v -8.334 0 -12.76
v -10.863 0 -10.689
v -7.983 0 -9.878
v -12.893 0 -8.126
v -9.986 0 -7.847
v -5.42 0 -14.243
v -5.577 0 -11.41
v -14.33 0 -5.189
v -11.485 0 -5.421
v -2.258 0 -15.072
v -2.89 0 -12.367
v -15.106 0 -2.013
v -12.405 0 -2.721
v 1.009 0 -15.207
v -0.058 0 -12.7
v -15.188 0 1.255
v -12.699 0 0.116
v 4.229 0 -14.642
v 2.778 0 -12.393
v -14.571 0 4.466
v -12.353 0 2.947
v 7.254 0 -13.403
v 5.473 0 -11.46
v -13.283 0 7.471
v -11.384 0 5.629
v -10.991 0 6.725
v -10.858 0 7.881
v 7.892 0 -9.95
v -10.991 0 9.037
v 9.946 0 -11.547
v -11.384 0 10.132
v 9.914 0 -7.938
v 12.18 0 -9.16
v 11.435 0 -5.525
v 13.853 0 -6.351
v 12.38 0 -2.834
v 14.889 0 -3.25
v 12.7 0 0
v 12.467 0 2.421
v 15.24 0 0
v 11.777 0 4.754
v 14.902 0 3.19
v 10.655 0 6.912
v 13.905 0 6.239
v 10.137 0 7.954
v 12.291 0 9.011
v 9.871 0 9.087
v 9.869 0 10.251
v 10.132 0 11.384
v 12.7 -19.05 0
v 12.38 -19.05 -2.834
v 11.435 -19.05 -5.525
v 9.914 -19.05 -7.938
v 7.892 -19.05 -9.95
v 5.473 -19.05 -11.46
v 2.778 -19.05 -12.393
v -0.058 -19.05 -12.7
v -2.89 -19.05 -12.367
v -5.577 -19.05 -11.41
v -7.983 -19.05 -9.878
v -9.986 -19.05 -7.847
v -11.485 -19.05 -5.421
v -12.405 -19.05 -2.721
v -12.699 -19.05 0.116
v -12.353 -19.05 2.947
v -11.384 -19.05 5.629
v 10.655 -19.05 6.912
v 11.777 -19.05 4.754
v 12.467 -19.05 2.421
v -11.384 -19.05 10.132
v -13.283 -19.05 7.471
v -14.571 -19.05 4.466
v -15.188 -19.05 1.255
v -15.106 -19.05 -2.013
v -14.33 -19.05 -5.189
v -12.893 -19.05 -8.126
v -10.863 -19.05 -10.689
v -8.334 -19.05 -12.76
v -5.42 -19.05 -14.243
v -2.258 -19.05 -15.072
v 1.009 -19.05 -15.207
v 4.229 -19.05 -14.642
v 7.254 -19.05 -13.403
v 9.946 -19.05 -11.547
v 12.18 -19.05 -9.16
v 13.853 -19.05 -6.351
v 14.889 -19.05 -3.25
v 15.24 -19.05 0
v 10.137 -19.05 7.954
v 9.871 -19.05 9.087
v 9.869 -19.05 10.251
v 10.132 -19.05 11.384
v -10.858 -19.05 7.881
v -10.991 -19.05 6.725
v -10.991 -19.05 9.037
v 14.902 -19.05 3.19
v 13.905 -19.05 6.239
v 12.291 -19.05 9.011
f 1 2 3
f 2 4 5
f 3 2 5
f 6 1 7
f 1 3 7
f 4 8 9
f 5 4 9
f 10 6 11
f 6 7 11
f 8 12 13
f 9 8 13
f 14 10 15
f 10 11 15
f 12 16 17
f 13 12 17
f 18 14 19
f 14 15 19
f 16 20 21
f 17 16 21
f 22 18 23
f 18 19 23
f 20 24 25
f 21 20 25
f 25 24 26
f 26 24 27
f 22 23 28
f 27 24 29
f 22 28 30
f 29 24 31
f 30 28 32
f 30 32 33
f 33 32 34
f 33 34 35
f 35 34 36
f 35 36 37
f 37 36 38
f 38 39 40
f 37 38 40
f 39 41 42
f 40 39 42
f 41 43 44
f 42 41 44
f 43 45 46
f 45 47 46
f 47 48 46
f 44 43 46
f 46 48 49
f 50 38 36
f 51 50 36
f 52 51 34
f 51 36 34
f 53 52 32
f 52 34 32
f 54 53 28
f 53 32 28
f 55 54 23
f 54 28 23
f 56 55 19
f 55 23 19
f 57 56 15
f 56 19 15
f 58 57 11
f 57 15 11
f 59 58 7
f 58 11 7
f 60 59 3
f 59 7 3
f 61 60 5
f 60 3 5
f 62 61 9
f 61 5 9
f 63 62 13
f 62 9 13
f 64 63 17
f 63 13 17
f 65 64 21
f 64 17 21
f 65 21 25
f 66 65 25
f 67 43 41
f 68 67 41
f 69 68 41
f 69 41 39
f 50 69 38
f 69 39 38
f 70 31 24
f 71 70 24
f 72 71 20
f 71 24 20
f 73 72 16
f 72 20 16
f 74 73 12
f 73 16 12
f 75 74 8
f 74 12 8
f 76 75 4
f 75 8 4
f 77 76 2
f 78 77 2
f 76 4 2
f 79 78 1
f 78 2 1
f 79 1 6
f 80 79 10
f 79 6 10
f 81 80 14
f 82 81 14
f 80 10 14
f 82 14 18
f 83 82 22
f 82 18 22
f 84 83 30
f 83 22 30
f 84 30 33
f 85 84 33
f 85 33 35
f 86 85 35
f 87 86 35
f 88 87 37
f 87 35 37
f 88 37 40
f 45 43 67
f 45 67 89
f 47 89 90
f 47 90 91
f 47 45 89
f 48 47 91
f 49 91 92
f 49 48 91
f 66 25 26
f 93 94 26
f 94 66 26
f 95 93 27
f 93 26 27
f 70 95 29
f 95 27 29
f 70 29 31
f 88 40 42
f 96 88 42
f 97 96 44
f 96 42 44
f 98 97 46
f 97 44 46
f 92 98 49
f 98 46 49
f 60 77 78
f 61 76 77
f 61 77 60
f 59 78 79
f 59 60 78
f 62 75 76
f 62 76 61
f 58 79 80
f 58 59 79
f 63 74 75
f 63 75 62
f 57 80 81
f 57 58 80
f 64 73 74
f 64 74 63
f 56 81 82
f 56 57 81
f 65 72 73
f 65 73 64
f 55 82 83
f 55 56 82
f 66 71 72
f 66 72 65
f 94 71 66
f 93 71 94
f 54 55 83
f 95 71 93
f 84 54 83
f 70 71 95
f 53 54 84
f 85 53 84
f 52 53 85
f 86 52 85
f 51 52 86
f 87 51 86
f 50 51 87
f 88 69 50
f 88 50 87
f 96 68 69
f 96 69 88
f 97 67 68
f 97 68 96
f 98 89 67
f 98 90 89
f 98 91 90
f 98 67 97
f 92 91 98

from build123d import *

# Parameters (mm, degrees)
F1_DEPTH    = 19.05
F2_T1_DEPTH = 36.0210888614


# Not quite as in the source:
# - a fillet or chamfer that OpenCascade refuses, or shapes differently, is made with other operations: its cross-section is extruded or revolved along the edge and cut away or added


with BuildPart() as f1:
    # F0 (on Front) → F1 (new body)
    with BuildSketch(Plane.XZ):
        with BuildLine():
            ThreePointArc((8.4433957221, 9.4867838955), (11.5870860373, 5.1989842435), (12.7, 0))
            ThreePointArc((12.7, 0), (-4.5170700973, -11.869544125), (-9.4867838955, 8.4433957221))
            Line((-9.4867838955, 8.4433957221), (-11.3841406746, 10.1320748666))
            ThreePointArc((-11.3841406746, 10.1320748666), (-5.4204841167, -14.24345295), (15.24, 0))
            ThreePointArc((15.24, 0), (13.9045032448, 6.2387810922), (10.1320748666, 11.3841406746))
            Line((10.1320748666, 11.3841406746), (8.4433957221, 9.4867838955))
        make_face()
    extrude(amount=F1_DEPTH)

    # F2: fillet of radius 5.08 on 2 edges, made by hand

    # F2_s2 → F2_t1 (cut)
    with BuildSketch(Plane.XZ.offset(-8.4855444307)):
        with BuildLine():
            ThreePointArc((-11.3843237056, 5.6291361473), (-10.8580531921, 7.8805841193), (-11.3841406746, 10.1320748666))
            Line((-11.3841406746, 10.1320748666), (-9.4867838955, 8.4433957221))
            ThreePointArc((-9.4867838955, 8.4433957221), (-10.5299951264, 7.0999438475), (-11.3843237056, 5.6291361473))
        make_face()
        with BuildLine():
            ThreePointArc((10.6545556025, 6.9116166642), (9.8706902669, 9.0868255644), (10.1320748666, 11.3841406746))
            Line((10.1320748666, 11.3841406746), (8.4433957221, 9.4867838955))
            ThreePointArc((8.4433957221, 9.4867838955), (9.6353934931, 8.2734026998), (10.6545556025, 6.9116166642))
        make_face()
    extrude(amount=F2_T1_DEPTH, mode=Mode.SUBTRACT)


solid = f1.part
